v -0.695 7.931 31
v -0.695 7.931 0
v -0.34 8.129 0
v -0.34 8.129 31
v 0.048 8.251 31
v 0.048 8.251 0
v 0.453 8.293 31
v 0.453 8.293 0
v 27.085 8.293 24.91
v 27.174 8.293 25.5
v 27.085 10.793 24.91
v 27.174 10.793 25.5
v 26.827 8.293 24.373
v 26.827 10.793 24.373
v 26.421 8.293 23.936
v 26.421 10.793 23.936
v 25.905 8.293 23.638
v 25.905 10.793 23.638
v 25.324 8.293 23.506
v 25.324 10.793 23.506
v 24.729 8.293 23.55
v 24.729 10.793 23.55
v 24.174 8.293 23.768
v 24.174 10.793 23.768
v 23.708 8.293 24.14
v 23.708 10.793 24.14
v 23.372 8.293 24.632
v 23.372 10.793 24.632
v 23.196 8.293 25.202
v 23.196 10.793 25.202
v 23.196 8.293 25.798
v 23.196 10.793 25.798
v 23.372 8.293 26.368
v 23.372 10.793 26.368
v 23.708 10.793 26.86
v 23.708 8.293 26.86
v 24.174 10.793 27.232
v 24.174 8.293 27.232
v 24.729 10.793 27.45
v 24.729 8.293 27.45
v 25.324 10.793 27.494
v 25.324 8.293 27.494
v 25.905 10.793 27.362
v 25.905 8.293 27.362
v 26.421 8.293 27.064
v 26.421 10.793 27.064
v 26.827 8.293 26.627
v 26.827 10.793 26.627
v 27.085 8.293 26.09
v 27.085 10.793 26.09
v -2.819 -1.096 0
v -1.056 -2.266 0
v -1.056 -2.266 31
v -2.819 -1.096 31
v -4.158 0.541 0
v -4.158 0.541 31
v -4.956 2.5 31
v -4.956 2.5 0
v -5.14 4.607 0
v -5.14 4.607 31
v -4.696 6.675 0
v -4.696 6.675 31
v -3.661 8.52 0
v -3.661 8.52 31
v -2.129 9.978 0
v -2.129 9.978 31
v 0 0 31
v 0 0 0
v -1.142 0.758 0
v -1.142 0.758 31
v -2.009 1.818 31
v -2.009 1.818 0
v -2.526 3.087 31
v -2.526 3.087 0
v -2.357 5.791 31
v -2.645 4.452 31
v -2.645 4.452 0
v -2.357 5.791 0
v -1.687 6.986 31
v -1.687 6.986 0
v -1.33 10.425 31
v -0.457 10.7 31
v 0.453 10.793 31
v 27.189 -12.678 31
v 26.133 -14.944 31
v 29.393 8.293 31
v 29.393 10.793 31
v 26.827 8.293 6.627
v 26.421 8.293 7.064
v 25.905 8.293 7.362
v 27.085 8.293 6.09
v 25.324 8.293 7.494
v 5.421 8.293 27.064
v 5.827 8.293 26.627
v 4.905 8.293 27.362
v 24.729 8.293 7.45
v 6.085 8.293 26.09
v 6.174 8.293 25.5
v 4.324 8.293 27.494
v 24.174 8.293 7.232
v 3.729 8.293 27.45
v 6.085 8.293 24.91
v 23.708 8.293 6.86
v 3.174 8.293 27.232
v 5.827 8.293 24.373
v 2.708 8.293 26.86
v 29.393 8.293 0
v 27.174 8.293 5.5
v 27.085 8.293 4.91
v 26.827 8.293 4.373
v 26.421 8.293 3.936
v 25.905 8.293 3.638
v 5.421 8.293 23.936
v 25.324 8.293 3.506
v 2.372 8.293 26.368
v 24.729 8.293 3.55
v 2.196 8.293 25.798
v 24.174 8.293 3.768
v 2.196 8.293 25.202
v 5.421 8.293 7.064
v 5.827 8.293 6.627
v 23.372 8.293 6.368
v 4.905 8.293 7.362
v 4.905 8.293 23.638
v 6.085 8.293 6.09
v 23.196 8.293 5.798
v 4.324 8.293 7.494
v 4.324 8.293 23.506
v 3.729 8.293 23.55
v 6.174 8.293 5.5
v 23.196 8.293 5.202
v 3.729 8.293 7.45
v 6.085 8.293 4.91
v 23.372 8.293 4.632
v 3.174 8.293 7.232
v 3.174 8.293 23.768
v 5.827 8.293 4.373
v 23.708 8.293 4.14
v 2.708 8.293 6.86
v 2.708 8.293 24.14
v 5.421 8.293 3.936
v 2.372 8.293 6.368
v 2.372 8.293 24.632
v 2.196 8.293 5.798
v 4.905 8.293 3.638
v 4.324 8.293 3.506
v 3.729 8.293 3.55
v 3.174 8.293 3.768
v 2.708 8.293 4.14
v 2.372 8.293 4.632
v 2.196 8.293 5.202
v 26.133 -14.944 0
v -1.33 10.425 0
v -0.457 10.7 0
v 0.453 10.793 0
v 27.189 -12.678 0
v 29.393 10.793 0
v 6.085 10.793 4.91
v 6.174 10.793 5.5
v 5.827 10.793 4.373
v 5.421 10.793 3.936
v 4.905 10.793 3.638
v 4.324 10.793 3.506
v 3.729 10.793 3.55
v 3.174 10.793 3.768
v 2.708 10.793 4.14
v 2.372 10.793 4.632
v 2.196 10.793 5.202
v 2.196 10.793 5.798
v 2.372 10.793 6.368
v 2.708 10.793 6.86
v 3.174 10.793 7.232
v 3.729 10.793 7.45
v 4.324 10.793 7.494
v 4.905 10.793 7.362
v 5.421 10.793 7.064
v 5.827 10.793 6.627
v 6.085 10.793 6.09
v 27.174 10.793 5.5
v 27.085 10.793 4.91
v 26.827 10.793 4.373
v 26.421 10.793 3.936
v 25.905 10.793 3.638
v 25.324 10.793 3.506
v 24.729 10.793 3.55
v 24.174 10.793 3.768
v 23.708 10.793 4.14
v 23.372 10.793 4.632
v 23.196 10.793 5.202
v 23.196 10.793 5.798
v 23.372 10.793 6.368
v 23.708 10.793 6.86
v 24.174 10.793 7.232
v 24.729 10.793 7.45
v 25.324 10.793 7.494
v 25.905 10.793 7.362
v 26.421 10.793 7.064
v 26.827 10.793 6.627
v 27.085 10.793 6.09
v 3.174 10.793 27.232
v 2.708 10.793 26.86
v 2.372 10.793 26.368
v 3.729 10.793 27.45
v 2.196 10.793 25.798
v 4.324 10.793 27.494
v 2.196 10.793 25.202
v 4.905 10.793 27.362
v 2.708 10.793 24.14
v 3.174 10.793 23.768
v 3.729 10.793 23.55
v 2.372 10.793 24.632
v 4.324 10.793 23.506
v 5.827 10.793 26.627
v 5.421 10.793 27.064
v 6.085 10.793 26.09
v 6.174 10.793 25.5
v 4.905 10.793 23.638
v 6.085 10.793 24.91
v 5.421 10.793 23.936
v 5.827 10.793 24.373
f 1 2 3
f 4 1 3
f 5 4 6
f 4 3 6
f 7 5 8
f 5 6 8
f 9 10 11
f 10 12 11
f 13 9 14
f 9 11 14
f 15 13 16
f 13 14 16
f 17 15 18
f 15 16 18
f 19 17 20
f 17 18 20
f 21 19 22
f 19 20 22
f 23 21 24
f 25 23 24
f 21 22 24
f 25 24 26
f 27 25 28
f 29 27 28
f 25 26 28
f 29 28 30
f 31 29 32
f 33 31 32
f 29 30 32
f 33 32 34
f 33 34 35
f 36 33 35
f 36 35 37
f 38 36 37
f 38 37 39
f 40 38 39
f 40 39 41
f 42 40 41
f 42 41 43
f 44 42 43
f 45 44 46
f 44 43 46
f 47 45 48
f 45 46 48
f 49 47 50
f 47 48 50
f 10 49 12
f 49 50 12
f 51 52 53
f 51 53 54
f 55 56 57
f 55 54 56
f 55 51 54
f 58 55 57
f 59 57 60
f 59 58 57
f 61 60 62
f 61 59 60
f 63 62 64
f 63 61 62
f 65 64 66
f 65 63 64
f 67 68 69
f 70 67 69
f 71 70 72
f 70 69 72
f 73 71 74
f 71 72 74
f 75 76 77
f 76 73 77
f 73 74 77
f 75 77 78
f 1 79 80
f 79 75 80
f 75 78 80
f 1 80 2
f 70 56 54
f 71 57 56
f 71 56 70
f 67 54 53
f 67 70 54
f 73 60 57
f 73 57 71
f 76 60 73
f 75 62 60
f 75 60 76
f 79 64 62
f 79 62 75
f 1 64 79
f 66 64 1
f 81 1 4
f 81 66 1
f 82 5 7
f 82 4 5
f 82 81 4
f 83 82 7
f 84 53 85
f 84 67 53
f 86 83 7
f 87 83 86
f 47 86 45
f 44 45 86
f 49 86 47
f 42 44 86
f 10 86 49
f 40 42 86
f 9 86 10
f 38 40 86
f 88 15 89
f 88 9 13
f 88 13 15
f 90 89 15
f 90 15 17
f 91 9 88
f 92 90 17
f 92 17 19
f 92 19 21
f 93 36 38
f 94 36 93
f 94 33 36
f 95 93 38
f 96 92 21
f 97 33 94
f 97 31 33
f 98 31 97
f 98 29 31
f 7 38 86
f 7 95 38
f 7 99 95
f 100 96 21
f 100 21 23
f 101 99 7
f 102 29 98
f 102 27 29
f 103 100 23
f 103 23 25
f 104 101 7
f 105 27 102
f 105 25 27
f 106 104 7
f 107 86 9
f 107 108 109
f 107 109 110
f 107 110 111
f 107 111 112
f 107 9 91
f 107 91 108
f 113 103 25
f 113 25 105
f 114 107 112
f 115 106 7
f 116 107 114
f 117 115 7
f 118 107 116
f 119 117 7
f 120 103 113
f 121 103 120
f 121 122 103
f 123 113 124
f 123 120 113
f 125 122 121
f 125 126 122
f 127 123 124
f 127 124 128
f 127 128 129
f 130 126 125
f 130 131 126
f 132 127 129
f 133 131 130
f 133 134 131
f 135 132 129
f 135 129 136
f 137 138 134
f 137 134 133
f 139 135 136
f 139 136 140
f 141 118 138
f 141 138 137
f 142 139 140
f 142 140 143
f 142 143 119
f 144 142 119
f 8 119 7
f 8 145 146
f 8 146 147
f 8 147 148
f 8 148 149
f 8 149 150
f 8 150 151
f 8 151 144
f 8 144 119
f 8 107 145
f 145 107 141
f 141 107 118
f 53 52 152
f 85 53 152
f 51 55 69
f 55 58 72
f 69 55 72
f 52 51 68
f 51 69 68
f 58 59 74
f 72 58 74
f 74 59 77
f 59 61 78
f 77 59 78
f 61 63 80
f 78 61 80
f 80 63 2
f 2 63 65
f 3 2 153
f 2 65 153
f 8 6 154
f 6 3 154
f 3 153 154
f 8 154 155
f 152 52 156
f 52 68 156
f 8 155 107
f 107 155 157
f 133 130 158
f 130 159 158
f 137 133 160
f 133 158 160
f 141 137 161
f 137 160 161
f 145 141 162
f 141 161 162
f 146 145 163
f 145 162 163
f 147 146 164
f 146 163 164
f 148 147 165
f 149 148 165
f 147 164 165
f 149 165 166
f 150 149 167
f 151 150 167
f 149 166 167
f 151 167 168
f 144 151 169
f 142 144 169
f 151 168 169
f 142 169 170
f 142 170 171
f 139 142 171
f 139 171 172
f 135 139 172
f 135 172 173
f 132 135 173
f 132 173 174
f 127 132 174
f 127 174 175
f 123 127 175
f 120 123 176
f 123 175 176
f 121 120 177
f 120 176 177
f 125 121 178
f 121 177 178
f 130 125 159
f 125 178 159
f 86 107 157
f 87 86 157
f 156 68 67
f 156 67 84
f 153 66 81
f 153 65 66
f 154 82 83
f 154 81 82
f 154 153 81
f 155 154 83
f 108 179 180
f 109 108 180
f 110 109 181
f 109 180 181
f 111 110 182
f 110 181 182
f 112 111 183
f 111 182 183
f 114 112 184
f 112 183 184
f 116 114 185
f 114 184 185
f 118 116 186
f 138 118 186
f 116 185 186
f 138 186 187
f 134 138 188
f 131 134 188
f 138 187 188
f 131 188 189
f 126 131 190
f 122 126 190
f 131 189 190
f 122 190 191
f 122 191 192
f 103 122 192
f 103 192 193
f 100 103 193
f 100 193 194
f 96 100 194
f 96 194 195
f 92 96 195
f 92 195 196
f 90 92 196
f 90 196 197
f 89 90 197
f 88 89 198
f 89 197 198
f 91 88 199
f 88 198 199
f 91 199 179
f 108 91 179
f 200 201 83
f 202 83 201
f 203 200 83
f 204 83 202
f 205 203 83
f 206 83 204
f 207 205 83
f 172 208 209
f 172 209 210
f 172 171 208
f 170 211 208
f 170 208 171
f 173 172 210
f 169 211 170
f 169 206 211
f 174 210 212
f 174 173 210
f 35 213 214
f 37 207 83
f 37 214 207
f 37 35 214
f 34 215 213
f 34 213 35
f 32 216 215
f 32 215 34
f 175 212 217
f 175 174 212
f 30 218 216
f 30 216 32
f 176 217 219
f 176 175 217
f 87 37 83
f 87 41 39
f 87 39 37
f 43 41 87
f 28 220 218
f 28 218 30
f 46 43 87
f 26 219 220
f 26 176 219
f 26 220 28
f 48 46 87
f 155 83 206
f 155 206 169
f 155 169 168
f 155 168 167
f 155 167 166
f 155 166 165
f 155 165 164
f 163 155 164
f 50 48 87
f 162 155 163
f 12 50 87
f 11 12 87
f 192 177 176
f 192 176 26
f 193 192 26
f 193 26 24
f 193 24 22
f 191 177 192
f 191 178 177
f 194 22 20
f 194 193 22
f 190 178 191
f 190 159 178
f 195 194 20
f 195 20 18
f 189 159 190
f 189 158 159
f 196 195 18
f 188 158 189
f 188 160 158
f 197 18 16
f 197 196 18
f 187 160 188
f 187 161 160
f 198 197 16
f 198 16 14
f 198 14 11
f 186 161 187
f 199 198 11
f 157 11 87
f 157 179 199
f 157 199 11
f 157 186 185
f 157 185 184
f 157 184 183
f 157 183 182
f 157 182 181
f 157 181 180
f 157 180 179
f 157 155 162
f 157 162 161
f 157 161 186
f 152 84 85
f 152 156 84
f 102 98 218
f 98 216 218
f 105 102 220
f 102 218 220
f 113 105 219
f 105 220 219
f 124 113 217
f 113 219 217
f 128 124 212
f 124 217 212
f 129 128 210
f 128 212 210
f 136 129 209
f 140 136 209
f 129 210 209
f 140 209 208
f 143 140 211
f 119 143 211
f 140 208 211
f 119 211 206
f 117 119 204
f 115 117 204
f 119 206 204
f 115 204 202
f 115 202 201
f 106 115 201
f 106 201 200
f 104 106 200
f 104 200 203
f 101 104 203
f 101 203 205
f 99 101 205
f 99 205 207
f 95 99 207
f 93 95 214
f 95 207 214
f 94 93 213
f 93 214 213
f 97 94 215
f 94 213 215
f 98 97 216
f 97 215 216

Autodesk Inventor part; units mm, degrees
ref_plane "YZ Plane" through (0, 0, 0) normal (1, 0, 0) x (0, 1, 0)
ref_plane "XZ Plane" through (0, 0, 0) normal (0, 1, 0) x (-1, 0, 0)
sketch "Sketch1" plane through (0, 0, 0) normal (0, 0, 1) x (1, 0, 0)
  line L0 (0, 0) -> (27.1892, -12.6785) projected
  line L1 (-1.0565, -2.2658) -> (26.1327, -14.9443) projected
  line L2 (-1.8478, -3.9627) -> (0.8452, 1.8126) projected
  line L3 (27.1892, -12.6785) -> (26.1327, -14.9443) projected
  line L4 (29.393, 8.2928) -> (0.4528, 8.2928)
  arc A0 (-0.6947, 7.9309) -> (0, 0) centre (1.9427, 4.166) ccw
  arc A1 (0.4528, 8.2928) -> (-0.6947, 7.9309) centre (0.4528, 6.2928) ccw
  arc A2 (-2.129, 9.9785) -> (-1.0565, -2.2658) centre (1.9427, 4.166) ccw
  arc A3 (0.4528, 10.7928) -> (-2.129, 9.9785) centre (0.4528, 6.2928) ccw
  line L5 (0.4528, 10.7928) -> (29.393, 10.7928)
  line L6 (29.393, 8.2928) -> (29.393, 10.7928)
  point P0 (-0.082, 8.2928)
  dimension "d2" = 2
ref_plane "Work Plane1" through (-1.0565, -14.9443, 31) normal (0, 0, -1) x (0, 1, 0)
extrude "Extrusion1" add sketch "Sketch1" along normal up to surface (31 mm away)
sketch "Sketch2" plane through (0.4528, 10.7928, 0) normal (0, 1, 0) x (1, 0, 0)
  line L0 (28.9401, 0) -> (28.9401, -31) projected
  line L1 (0, 0) -> (0, -31) projected
  line L2 (28.9401, 0) -> (0, 0)
  line L3 (0, 0) -> (0, -15.5)
  line L4 (0, -15.5) -> (28.9401, -15.5)
  line L5 (28.9401, -15.5) -> (28.9401, 0)
  line L6 (24.7213, -15.5) -> (28.7213, -15.5)
  line L7 (24.7213, -15.5) -> (24.7213, -25.5)
  line L8 (24.7213, -25.5) -> (3.7213, -25.5)
  line L9 (3.7213, -25.5) -> (3.7213, -5.5)
  line L10 (3.7213, -5.5) -> (24.7213, -5.5)
  line L11 (24.7213, -5.5) -> (24.7213, -25.5)
  circle A0 centre (24.7213, -5.5) radius 2
  circle A1 centre (24.7213, -25.5) radius 2
  circle A2 centre (3.7213, -25.5) radius 2
  circle A3 centre (3.7213, -5.5) radius 2
  point P0 (-0.4528, 0)
  dimension "d5" = 4
  dimension "d6" = 10
  dimension "d7" = 21
  dimension "d8" = 20
  dimension "d9" = 4
  dimension "d10" = 4
  dimension "d11" = 4
  dimension "d12" = 4
extrude "Extrusion2" cut sketch "Sketch2" against normal up to surface (2.5 mm away) contours A1 L8 L7 | L7 L8 A1 | A0 L10 L11 | L11 L10 A0 | A2 L8 L9 | L9 L8 A2 | A3 L10 L9 | L9 L10 A3
properties part number "helmet_holder"
